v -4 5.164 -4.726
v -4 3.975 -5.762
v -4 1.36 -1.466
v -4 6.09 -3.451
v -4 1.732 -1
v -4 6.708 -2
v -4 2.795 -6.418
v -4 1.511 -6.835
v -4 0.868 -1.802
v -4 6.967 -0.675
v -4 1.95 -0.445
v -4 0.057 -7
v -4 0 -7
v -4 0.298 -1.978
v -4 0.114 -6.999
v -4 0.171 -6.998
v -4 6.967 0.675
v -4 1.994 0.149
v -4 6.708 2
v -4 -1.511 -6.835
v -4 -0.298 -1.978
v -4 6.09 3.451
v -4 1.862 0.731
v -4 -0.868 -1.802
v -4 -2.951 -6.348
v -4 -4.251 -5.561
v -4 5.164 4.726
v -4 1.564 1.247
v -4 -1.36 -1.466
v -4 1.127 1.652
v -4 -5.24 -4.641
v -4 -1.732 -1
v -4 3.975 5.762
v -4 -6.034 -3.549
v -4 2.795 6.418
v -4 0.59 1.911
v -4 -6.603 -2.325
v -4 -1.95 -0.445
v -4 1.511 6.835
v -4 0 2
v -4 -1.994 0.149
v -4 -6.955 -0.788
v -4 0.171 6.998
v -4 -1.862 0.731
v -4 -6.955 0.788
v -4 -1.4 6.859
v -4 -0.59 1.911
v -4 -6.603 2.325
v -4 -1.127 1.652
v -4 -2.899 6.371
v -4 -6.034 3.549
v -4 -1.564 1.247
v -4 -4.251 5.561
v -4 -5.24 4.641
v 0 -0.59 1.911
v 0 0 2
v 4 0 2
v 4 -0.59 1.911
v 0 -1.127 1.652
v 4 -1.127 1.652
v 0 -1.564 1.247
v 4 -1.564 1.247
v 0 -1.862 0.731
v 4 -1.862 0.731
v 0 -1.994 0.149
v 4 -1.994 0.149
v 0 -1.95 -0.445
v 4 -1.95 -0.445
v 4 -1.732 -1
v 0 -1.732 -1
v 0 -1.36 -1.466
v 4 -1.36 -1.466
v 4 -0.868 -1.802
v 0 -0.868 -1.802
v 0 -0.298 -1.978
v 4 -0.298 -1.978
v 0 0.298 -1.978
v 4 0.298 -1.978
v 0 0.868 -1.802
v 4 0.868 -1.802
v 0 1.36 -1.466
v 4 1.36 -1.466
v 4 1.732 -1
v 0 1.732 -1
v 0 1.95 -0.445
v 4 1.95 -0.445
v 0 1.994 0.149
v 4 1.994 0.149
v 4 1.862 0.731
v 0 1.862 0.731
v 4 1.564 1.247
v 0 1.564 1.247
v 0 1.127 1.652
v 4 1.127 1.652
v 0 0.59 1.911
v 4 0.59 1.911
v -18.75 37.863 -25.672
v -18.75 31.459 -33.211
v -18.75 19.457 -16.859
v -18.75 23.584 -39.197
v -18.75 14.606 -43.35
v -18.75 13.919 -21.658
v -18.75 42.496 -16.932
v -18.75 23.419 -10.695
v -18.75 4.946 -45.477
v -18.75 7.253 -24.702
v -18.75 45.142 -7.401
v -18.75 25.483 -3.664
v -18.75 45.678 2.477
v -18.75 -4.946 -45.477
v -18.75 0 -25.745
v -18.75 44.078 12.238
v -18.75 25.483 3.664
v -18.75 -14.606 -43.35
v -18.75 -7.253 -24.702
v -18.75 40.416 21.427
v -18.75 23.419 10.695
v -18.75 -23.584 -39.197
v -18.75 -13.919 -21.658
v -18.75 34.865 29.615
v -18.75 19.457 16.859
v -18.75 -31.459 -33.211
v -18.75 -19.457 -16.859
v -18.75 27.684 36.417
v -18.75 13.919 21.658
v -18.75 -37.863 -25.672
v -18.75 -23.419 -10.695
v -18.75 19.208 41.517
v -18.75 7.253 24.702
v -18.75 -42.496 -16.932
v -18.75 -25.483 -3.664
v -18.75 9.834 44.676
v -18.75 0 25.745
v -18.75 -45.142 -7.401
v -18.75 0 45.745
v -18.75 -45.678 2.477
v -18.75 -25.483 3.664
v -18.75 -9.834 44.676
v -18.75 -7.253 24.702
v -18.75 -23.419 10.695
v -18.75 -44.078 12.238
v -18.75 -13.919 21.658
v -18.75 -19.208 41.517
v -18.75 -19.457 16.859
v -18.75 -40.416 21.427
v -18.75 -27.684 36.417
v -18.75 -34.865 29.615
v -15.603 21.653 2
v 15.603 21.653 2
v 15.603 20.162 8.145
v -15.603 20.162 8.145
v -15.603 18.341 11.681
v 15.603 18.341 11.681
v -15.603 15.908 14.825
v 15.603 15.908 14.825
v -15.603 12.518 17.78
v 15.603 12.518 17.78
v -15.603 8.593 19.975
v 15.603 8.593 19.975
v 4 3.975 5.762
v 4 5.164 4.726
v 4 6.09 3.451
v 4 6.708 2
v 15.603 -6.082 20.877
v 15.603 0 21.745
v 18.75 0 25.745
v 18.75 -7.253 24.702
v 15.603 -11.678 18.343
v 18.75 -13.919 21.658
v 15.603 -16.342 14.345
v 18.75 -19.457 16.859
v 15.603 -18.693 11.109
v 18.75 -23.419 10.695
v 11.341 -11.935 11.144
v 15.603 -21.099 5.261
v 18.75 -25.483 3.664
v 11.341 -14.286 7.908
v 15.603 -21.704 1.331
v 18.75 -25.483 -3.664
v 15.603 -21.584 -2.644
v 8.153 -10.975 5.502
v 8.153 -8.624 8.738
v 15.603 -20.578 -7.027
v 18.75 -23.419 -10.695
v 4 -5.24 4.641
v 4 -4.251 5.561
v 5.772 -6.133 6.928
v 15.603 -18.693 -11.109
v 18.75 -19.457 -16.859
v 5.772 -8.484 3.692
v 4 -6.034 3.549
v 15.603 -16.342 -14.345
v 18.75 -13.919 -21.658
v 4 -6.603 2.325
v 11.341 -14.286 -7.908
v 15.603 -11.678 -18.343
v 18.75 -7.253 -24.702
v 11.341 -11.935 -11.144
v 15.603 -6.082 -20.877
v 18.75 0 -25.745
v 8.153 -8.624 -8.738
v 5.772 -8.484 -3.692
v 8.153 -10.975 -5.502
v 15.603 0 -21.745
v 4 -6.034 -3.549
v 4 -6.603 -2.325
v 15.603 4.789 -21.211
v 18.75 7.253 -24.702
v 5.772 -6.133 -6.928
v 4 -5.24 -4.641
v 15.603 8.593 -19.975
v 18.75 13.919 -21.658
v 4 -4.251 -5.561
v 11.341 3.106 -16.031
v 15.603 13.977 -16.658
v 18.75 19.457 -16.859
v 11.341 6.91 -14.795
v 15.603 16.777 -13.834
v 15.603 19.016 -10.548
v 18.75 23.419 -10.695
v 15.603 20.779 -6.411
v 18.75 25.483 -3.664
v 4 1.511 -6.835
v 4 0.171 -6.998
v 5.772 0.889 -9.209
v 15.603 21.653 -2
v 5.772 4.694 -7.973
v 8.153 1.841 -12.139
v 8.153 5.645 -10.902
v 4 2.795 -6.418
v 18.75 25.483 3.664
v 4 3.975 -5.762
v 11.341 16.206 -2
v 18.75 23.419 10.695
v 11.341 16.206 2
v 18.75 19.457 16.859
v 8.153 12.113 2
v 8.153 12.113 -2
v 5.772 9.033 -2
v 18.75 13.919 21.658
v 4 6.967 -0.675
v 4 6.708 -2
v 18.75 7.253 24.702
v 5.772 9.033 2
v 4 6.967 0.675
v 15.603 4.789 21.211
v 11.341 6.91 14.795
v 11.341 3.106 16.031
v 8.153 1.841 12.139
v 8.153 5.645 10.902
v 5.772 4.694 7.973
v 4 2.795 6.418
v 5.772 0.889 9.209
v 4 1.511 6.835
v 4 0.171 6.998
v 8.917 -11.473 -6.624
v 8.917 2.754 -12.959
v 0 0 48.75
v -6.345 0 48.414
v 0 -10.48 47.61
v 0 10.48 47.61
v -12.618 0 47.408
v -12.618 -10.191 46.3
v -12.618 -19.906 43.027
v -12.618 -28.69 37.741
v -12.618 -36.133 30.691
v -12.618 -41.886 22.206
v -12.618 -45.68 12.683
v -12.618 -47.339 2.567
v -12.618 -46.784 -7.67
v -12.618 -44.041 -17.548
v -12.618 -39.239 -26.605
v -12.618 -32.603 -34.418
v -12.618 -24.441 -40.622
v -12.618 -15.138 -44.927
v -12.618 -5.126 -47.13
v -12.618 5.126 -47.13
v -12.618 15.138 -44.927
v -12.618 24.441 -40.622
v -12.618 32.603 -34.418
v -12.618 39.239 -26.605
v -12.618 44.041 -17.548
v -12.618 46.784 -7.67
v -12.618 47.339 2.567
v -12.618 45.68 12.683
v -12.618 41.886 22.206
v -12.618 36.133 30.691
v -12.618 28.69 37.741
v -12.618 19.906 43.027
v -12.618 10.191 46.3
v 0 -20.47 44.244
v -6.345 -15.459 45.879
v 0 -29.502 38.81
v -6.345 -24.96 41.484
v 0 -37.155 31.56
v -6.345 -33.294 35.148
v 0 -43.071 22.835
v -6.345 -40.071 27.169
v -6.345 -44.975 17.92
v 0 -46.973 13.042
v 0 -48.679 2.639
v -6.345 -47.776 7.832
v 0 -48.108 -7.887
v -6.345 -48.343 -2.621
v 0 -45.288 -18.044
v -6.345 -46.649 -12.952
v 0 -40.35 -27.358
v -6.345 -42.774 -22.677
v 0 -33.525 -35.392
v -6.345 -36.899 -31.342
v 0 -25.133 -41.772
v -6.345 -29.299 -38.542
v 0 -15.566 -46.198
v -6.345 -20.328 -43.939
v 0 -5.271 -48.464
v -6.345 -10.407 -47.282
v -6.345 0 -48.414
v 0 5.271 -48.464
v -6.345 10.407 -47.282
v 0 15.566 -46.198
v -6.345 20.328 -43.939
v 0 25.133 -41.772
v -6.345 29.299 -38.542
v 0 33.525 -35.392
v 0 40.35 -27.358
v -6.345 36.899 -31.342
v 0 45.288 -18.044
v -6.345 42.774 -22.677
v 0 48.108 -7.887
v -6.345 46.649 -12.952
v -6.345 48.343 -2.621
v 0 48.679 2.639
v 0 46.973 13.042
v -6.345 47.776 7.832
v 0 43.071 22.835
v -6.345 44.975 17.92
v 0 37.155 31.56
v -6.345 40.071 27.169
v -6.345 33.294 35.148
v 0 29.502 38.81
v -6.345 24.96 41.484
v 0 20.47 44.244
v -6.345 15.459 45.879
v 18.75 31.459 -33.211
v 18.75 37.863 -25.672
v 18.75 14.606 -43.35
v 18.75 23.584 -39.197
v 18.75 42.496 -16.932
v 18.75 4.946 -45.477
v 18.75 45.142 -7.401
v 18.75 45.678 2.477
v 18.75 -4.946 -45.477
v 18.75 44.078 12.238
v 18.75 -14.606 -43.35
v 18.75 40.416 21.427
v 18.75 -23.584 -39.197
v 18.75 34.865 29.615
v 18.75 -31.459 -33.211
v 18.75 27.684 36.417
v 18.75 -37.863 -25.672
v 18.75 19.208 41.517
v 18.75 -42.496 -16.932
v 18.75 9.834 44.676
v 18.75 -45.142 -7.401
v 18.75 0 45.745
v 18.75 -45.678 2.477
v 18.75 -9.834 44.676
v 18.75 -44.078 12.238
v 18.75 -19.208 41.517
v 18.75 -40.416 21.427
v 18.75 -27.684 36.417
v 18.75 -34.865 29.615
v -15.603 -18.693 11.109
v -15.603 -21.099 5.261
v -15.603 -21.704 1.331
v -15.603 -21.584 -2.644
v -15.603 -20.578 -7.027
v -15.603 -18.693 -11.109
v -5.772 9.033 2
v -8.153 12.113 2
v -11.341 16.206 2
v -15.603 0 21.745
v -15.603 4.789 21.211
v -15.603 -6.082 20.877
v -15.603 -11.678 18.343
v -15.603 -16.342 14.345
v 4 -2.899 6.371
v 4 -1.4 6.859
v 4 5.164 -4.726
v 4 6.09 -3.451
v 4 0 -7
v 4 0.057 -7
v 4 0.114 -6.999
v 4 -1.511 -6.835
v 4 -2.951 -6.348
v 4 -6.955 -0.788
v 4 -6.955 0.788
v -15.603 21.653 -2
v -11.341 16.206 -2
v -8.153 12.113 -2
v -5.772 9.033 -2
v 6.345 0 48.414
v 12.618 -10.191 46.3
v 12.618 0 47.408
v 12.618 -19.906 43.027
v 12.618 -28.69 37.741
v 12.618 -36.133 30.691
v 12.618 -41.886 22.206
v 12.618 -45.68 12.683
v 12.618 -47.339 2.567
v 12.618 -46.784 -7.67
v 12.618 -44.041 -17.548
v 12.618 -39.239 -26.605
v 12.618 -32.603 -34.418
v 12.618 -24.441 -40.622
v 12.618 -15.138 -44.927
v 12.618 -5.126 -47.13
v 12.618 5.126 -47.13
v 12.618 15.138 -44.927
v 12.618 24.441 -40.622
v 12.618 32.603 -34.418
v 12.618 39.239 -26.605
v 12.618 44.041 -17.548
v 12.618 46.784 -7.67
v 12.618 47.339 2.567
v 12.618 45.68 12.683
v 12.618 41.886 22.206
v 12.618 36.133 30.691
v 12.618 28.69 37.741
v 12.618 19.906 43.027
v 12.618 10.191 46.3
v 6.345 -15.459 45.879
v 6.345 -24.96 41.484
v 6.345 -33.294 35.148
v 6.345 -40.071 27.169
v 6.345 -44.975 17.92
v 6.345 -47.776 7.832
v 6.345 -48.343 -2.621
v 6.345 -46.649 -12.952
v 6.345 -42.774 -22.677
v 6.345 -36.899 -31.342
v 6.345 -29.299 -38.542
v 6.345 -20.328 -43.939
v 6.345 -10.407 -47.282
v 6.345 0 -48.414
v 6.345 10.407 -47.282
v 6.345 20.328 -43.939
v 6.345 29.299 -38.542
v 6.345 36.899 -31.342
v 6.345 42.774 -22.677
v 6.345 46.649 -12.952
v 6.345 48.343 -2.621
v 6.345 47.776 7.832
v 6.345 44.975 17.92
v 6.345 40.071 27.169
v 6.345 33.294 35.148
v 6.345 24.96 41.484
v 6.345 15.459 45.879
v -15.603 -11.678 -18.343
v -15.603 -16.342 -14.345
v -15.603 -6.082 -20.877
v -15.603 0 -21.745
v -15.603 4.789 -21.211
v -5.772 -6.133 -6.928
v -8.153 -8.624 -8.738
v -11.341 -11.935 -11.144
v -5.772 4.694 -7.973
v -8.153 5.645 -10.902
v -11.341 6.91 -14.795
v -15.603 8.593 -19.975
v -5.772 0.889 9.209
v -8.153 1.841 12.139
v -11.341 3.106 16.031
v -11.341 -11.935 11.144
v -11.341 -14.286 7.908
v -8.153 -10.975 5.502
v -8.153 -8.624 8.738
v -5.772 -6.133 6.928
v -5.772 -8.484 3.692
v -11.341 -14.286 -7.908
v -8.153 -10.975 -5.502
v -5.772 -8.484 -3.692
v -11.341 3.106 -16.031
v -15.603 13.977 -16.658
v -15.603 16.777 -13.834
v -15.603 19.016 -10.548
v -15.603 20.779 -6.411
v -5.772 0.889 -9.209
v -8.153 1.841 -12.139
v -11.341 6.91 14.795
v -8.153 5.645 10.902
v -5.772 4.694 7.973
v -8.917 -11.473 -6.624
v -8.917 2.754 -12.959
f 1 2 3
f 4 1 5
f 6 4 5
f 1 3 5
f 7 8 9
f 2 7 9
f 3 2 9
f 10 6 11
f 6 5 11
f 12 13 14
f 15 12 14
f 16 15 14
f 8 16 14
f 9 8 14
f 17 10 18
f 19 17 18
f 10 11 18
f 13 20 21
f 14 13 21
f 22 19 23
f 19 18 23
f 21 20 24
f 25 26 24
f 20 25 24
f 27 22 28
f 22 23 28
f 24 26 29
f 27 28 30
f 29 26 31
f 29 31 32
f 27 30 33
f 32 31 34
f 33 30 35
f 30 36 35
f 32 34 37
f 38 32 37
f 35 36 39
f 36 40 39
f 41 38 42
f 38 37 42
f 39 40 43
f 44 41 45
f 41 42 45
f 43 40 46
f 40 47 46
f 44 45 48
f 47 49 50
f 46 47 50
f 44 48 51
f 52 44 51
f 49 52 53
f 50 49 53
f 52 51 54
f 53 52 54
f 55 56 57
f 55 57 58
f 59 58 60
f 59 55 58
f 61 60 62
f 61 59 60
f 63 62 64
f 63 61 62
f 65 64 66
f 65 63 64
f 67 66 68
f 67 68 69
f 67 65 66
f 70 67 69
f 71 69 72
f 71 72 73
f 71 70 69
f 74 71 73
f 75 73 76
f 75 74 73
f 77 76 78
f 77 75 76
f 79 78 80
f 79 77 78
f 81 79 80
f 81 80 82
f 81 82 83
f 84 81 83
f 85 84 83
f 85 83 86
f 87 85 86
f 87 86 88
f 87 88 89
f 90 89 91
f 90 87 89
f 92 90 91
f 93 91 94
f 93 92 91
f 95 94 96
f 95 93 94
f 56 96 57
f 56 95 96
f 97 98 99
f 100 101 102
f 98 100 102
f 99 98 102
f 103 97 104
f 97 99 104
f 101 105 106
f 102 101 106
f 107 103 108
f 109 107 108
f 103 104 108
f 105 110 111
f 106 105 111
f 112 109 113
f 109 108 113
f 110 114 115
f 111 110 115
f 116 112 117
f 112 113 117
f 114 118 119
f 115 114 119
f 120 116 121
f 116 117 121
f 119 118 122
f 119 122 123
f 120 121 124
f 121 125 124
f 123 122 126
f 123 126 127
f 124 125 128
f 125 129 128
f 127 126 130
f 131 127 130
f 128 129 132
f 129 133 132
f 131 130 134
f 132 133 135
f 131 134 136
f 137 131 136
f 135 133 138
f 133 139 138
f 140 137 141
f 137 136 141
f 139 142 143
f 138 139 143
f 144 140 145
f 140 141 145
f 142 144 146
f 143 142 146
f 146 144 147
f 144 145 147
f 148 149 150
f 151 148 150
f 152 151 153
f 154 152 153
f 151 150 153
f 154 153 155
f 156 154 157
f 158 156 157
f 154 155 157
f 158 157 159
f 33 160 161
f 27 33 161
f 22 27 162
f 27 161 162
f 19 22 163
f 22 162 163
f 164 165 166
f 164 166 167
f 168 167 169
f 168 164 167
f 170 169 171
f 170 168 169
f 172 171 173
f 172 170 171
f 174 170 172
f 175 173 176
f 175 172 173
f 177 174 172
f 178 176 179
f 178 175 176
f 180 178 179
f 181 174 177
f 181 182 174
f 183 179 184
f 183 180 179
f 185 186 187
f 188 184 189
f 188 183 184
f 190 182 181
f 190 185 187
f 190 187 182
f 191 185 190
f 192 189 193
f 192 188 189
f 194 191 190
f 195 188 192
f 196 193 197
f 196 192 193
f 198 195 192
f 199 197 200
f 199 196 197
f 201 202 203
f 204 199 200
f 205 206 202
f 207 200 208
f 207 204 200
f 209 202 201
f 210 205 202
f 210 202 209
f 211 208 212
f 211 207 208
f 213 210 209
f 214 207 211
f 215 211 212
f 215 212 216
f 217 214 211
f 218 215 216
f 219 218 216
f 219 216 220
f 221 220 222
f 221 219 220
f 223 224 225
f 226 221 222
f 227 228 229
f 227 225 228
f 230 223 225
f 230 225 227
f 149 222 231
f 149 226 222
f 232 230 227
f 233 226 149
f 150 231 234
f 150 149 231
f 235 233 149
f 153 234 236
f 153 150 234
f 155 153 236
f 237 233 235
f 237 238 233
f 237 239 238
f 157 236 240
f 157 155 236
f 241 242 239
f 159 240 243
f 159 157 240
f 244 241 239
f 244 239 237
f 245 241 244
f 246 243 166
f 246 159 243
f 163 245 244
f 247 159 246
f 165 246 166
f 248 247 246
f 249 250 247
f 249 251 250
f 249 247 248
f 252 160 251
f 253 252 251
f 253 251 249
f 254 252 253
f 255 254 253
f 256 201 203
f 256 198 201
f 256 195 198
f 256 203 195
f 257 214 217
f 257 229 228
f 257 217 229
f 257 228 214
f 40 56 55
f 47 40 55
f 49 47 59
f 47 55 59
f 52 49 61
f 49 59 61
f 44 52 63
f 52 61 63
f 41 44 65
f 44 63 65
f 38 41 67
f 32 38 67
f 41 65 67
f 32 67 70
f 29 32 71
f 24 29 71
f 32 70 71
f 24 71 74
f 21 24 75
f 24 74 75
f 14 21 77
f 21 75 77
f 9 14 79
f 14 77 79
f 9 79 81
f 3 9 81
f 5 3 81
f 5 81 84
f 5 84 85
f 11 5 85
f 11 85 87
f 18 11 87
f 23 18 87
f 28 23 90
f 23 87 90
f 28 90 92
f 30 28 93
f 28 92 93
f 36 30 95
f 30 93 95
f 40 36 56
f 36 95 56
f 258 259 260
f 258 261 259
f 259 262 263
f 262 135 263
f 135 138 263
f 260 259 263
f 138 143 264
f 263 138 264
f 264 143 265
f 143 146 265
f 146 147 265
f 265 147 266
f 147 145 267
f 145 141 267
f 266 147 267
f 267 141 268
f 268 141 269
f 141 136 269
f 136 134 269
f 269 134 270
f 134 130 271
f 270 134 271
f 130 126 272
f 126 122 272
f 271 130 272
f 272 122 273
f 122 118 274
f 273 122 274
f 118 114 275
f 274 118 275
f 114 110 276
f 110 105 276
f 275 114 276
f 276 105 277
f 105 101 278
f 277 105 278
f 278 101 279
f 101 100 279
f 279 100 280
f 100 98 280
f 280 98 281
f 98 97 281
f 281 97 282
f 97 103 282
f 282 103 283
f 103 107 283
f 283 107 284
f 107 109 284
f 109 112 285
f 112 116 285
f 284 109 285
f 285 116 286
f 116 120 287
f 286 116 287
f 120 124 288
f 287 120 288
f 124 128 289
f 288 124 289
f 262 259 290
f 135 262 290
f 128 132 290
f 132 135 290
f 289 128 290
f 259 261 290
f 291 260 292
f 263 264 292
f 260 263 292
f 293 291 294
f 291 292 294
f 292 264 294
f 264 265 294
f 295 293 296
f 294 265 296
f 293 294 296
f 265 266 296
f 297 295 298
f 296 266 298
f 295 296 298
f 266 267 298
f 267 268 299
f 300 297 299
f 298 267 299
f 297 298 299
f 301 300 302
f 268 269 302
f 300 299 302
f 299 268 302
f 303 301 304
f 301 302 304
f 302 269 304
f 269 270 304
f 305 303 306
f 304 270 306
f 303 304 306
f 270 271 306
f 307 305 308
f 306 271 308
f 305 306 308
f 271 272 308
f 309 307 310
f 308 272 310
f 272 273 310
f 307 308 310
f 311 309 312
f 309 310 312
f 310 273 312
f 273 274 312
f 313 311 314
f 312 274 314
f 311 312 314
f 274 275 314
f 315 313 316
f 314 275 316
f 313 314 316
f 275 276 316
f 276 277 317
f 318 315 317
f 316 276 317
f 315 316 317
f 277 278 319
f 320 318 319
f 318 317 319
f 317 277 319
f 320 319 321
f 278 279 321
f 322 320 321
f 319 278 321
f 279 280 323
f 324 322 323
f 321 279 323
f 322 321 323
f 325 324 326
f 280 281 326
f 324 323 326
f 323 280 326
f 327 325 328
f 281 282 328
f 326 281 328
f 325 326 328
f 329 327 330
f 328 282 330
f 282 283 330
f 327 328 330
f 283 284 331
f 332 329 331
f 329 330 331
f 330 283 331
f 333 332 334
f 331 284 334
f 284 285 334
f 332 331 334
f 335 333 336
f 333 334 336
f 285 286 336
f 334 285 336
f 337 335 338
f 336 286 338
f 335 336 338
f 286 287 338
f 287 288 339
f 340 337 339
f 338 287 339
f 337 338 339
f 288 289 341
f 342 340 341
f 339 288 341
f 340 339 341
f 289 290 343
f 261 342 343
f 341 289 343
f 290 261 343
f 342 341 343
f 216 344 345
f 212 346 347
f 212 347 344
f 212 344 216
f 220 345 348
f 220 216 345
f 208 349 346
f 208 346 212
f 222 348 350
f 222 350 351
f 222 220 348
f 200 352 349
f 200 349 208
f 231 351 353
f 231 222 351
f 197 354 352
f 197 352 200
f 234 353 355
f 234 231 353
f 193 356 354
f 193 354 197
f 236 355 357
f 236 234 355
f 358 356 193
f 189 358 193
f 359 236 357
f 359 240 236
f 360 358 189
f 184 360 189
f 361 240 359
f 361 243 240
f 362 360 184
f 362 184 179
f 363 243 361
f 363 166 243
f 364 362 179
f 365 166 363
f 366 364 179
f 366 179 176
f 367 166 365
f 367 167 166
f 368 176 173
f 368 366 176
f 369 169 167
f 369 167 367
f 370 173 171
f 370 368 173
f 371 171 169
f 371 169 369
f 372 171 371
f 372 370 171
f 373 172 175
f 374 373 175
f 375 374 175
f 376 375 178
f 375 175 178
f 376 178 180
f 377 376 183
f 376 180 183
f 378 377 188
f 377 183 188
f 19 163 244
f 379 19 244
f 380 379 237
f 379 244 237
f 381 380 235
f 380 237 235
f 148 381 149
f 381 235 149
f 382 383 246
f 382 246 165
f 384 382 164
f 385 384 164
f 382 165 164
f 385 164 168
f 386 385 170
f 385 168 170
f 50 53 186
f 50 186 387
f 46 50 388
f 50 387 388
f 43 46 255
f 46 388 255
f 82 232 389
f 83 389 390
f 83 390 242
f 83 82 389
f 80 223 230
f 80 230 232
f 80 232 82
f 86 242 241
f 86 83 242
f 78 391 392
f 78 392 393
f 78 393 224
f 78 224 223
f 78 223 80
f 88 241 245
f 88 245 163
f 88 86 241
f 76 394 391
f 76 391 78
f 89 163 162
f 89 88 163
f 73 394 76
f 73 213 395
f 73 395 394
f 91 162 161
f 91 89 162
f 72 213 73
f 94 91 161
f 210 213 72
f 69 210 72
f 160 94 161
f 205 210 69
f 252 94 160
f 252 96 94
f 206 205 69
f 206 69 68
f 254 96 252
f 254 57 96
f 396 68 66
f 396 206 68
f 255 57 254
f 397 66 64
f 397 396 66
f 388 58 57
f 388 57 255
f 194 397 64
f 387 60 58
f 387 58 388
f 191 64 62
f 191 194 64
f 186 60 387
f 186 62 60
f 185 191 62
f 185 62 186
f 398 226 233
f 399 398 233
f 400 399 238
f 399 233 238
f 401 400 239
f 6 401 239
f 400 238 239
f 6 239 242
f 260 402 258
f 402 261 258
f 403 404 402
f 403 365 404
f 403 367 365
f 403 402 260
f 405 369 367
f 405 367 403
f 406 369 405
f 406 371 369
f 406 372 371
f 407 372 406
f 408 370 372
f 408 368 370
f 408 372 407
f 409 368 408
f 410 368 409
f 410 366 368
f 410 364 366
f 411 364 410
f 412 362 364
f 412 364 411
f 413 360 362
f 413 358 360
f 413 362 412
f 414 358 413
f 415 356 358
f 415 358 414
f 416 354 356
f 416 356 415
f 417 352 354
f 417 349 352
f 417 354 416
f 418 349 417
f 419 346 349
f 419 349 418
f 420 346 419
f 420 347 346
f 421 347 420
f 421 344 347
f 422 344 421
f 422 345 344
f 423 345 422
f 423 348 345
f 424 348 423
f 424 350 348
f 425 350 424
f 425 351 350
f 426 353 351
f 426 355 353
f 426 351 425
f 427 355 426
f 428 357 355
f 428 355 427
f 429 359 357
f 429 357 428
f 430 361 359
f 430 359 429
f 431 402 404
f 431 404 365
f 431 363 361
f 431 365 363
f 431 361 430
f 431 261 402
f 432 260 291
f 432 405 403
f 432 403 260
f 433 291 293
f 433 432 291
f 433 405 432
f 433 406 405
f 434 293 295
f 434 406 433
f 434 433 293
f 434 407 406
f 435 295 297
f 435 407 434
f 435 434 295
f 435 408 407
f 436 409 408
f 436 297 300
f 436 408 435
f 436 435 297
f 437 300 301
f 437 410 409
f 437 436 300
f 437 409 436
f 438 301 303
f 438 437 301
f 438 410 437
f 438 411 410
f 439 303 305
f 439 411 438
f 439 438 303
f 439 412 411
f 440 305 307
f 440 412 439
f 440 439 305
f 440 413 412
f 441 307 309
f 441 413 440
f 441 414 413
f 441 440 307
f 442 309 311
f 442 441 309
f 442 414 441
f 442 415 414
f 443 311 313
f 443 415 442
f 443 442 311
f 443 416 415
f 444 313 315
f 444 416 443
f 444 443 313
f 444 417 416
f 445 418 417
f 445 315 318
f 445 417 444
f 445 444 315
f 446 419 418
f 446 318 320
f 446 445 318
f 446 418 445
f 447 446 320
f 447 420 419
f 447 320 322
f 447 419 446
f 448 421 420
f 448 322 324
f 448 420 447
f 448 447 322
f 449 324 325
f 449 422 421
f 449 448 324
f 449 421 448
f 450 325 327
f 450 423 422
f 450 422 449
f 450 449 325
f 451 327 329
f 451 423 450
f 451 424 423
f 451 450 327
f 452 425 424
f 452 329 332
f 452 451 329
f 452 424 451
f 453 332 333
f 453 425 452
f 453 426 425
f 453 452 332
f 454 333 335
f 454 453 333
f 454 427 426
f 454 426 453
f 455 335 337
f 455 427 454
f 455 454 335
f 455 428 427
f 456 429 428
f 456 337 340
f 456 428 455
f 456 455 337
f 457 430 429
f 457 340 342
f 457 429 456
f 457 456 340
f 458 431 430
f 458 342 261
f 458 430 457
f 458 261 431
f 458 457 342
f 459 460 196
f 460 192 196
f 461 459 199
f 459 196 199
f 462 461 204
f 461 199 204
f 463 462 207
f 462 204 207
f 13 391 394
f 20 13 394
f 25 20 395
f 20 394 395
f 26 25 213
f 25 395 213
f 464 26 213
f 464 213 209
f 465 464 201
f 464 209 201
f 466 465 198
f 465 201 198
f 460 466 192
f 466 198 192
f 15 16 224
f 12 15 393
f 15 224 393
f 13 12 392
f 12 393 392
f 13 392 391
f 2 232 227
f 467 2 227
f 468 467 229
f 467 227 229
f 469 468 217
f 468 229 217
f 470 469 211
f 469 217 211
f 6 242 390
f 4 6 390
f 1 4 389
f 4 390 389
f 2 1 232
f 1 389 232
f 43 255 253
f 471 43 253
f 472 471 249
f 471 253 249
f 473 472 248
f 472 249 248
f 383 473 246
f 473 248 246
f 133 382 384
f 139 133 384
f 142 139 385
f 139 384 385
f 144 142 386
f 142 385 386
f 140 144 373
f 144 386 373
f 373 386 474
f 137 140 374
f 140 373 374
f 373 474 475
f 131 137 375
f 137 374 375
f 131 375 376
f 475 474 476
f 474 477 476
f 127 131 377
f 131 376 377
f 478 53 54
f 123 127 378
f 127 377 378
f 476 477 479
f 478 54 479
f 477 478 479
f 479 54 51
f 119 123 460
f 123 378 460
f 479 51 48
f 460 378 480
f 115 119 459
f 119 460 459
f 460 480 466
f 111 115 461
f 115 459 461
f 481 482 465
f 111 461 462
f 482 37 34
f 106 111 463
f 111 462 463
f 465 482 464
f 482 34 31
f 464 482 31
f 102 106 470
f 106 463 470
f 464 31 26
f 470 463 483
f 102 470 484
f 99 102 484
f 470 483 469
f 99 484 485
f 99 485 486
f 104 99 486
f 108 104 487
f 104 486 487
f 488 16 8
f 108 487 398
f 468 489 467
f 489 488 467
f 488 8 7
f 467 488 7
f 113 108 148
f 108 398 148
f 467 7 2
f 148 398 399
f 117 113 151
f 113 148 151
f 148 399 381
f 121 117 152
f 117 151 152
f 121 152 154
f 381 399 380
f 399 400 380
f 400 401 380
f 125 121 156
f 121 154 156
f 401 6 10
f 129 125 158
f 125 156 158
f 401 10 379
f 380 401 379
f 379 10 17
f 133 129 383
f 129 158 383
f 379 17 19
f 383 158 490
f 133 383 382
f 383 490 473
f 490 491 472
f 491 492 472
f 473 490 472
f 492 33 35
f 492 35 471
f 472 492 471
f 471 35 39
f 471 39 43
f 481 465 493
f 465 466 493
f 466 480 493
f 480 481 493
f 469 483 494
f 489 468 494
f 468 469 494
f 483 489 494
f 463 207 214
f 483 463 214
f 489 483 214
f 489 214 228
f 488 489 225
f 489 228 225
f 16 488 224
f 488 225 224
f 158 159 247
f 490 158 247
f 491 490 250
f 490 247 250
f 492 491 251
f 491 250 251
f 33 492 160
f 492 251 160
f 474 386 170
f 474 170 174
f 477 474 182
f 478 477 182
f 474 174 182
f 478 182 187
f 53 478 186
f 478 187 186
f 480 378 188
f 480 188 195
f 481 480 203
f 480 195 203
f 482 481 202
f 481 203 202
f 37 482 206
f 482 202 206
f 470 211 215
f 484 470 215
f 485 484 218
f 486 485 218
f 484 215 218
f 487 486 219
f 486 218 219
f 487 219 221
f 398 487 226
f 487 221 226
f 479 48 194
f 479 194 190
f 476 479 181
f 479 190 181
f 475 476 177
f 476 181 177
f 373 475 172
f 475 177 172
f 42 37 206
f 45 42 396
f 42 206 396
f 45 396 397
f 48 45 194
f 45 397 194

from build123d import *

# Parameters (mm, degrees)
CUT_EXTRUDE1_DEPTH      = 19.7500001
CUT_EXTRUDE1_DEPTH_BACK = 19.7500001


with BuildPart() as part:
    # Sketch1 → Revolve1 (revolve)
    with BuildSketch(Plane(origin=(0, 0, 0), x_dir=(1, 0, 0), z_dir=(0, 1, 0))):
        with BuildLine():
            Line((18.75, -45.745065576), (18.75, -25.745065576))
            Line((18.75, -25.745065576), (4, -7))
            Line((4, -7), (4, -2))
            Line((4, -2), (0, -2))
            Line((0, -2), (0, -48.75))
            ThreePointArc((0, -48.75), (9.494631785, -47.99400364), (18.75, -45.745065576))
        make_face()
    revolve(axis=Axis((-21.521301372, 0, 0), (1, 0, 0)))

    # Mirror1: part across plane


with BuildPart() as part_1:
    add(part.part)
    add(part.part.mirror(Plane(origin=(0, 0, 2), x_dir=(0, 0, 1), z_dir=(-1, 0, 0))))

    # Sketch2 → Cut-Extrude1 (cut, two sides)
    with BuildSketch(Plane(origin=(0, 0, 0), x_dir=(0, 0, -1), z_dir=(1, 0, 0))) as cut_extrude1_sk:
        with BuildLine():
            ThreePointArc((-5.761847074, 3.975062049), (-4.114496766, 5.663118961), (-2, 6.708203932))
            Line((-2, 6.708203932), (-2, 21.652895347))
            ThreePointArc((-2, 21.652895347), (-12.781428856, 17.592127595), (-19.975093227, 8.593225672))
            Line((-19.975093227, 8.593225672), (-5.761847074, 3.975062049))
        make_face()
        with BuildLine():
            Line((2, 21.652895347), (2, 6.708203932))
            ThreePointArc((2, 6.708203932), (4.114496766, 5.663118961), (5.761847074, 3.975062049))
            Line((5.761847074, 3.975062049), (19.975093227, 8.593225672))
            ThreePointArc((19.975093227, 8.593225672), (12.781428856, 17.592127595), (2, 21.652895347))
        make_face()
        with BuildLine():
            Line((-14.345286543, -16.341989808), (-5.56101733, -4.251480479))
            ThreePointArc((-5.56101733, -4.251480479), (-6.657395614, -2.163118961), (-6.997915051, 0.170835984))
            Line((-6.997915051, 0.170835984), (-21.211161205, 4.788999607))
            ThreePointArc((-21.211161205, 4.788999607), (-20.680786313, -6.719594807), (-14.345286543, -16.341989808))
        make_face()
        with BuildLine():
            Line((21.211161205, 4.788999607), (6.997915051, 0.170835984))
            ThreePointArc((6.997915051, 0.170835984), (6.999478743, 0.085424353), (7, 0))
            ThreePointArc((7, 0), (6.630502293, -2.244201271), (5.56101733, -4.251480479))
            Line((5.56101733, -4.251480479), (14.345286543, -16.341989808))
            ThreePointArc((14.345286543, -16.341989808), (19.808925684, -8.969634338), (21.745065576, 0))
            ThreePointArc((21.745065576, 0), (21.611177296, 2.409334509), (21.211161205, 4.788999607))
        make_face()
        with BuildLine():
            Line((11.109218566, -18.693130818), (2.324949352, -6.602621488))
            ThreePointArc((2.324949352, -6.602621488), (0, -7), (-2.324949352, -6.602621488))
            Line((-2.324949352, -6.602621488), (-11.109218566, -18.693130818))
            ThreePointArc((-11.109218566, -18.693130818), (0, -21.745065576), (11.109218566, -18.693130818))
        make_face()
    extrude(amount=CUT_EXTRUDE1_DEPTH, mode=Mode.SUBTRACT)
    extrude(cut_extrude1_sk.sketch, amount=-CUT_EXTRUDE1_DEPTH_BACK, mode=Mode.SUBTRACT)


solid = part_1.part
